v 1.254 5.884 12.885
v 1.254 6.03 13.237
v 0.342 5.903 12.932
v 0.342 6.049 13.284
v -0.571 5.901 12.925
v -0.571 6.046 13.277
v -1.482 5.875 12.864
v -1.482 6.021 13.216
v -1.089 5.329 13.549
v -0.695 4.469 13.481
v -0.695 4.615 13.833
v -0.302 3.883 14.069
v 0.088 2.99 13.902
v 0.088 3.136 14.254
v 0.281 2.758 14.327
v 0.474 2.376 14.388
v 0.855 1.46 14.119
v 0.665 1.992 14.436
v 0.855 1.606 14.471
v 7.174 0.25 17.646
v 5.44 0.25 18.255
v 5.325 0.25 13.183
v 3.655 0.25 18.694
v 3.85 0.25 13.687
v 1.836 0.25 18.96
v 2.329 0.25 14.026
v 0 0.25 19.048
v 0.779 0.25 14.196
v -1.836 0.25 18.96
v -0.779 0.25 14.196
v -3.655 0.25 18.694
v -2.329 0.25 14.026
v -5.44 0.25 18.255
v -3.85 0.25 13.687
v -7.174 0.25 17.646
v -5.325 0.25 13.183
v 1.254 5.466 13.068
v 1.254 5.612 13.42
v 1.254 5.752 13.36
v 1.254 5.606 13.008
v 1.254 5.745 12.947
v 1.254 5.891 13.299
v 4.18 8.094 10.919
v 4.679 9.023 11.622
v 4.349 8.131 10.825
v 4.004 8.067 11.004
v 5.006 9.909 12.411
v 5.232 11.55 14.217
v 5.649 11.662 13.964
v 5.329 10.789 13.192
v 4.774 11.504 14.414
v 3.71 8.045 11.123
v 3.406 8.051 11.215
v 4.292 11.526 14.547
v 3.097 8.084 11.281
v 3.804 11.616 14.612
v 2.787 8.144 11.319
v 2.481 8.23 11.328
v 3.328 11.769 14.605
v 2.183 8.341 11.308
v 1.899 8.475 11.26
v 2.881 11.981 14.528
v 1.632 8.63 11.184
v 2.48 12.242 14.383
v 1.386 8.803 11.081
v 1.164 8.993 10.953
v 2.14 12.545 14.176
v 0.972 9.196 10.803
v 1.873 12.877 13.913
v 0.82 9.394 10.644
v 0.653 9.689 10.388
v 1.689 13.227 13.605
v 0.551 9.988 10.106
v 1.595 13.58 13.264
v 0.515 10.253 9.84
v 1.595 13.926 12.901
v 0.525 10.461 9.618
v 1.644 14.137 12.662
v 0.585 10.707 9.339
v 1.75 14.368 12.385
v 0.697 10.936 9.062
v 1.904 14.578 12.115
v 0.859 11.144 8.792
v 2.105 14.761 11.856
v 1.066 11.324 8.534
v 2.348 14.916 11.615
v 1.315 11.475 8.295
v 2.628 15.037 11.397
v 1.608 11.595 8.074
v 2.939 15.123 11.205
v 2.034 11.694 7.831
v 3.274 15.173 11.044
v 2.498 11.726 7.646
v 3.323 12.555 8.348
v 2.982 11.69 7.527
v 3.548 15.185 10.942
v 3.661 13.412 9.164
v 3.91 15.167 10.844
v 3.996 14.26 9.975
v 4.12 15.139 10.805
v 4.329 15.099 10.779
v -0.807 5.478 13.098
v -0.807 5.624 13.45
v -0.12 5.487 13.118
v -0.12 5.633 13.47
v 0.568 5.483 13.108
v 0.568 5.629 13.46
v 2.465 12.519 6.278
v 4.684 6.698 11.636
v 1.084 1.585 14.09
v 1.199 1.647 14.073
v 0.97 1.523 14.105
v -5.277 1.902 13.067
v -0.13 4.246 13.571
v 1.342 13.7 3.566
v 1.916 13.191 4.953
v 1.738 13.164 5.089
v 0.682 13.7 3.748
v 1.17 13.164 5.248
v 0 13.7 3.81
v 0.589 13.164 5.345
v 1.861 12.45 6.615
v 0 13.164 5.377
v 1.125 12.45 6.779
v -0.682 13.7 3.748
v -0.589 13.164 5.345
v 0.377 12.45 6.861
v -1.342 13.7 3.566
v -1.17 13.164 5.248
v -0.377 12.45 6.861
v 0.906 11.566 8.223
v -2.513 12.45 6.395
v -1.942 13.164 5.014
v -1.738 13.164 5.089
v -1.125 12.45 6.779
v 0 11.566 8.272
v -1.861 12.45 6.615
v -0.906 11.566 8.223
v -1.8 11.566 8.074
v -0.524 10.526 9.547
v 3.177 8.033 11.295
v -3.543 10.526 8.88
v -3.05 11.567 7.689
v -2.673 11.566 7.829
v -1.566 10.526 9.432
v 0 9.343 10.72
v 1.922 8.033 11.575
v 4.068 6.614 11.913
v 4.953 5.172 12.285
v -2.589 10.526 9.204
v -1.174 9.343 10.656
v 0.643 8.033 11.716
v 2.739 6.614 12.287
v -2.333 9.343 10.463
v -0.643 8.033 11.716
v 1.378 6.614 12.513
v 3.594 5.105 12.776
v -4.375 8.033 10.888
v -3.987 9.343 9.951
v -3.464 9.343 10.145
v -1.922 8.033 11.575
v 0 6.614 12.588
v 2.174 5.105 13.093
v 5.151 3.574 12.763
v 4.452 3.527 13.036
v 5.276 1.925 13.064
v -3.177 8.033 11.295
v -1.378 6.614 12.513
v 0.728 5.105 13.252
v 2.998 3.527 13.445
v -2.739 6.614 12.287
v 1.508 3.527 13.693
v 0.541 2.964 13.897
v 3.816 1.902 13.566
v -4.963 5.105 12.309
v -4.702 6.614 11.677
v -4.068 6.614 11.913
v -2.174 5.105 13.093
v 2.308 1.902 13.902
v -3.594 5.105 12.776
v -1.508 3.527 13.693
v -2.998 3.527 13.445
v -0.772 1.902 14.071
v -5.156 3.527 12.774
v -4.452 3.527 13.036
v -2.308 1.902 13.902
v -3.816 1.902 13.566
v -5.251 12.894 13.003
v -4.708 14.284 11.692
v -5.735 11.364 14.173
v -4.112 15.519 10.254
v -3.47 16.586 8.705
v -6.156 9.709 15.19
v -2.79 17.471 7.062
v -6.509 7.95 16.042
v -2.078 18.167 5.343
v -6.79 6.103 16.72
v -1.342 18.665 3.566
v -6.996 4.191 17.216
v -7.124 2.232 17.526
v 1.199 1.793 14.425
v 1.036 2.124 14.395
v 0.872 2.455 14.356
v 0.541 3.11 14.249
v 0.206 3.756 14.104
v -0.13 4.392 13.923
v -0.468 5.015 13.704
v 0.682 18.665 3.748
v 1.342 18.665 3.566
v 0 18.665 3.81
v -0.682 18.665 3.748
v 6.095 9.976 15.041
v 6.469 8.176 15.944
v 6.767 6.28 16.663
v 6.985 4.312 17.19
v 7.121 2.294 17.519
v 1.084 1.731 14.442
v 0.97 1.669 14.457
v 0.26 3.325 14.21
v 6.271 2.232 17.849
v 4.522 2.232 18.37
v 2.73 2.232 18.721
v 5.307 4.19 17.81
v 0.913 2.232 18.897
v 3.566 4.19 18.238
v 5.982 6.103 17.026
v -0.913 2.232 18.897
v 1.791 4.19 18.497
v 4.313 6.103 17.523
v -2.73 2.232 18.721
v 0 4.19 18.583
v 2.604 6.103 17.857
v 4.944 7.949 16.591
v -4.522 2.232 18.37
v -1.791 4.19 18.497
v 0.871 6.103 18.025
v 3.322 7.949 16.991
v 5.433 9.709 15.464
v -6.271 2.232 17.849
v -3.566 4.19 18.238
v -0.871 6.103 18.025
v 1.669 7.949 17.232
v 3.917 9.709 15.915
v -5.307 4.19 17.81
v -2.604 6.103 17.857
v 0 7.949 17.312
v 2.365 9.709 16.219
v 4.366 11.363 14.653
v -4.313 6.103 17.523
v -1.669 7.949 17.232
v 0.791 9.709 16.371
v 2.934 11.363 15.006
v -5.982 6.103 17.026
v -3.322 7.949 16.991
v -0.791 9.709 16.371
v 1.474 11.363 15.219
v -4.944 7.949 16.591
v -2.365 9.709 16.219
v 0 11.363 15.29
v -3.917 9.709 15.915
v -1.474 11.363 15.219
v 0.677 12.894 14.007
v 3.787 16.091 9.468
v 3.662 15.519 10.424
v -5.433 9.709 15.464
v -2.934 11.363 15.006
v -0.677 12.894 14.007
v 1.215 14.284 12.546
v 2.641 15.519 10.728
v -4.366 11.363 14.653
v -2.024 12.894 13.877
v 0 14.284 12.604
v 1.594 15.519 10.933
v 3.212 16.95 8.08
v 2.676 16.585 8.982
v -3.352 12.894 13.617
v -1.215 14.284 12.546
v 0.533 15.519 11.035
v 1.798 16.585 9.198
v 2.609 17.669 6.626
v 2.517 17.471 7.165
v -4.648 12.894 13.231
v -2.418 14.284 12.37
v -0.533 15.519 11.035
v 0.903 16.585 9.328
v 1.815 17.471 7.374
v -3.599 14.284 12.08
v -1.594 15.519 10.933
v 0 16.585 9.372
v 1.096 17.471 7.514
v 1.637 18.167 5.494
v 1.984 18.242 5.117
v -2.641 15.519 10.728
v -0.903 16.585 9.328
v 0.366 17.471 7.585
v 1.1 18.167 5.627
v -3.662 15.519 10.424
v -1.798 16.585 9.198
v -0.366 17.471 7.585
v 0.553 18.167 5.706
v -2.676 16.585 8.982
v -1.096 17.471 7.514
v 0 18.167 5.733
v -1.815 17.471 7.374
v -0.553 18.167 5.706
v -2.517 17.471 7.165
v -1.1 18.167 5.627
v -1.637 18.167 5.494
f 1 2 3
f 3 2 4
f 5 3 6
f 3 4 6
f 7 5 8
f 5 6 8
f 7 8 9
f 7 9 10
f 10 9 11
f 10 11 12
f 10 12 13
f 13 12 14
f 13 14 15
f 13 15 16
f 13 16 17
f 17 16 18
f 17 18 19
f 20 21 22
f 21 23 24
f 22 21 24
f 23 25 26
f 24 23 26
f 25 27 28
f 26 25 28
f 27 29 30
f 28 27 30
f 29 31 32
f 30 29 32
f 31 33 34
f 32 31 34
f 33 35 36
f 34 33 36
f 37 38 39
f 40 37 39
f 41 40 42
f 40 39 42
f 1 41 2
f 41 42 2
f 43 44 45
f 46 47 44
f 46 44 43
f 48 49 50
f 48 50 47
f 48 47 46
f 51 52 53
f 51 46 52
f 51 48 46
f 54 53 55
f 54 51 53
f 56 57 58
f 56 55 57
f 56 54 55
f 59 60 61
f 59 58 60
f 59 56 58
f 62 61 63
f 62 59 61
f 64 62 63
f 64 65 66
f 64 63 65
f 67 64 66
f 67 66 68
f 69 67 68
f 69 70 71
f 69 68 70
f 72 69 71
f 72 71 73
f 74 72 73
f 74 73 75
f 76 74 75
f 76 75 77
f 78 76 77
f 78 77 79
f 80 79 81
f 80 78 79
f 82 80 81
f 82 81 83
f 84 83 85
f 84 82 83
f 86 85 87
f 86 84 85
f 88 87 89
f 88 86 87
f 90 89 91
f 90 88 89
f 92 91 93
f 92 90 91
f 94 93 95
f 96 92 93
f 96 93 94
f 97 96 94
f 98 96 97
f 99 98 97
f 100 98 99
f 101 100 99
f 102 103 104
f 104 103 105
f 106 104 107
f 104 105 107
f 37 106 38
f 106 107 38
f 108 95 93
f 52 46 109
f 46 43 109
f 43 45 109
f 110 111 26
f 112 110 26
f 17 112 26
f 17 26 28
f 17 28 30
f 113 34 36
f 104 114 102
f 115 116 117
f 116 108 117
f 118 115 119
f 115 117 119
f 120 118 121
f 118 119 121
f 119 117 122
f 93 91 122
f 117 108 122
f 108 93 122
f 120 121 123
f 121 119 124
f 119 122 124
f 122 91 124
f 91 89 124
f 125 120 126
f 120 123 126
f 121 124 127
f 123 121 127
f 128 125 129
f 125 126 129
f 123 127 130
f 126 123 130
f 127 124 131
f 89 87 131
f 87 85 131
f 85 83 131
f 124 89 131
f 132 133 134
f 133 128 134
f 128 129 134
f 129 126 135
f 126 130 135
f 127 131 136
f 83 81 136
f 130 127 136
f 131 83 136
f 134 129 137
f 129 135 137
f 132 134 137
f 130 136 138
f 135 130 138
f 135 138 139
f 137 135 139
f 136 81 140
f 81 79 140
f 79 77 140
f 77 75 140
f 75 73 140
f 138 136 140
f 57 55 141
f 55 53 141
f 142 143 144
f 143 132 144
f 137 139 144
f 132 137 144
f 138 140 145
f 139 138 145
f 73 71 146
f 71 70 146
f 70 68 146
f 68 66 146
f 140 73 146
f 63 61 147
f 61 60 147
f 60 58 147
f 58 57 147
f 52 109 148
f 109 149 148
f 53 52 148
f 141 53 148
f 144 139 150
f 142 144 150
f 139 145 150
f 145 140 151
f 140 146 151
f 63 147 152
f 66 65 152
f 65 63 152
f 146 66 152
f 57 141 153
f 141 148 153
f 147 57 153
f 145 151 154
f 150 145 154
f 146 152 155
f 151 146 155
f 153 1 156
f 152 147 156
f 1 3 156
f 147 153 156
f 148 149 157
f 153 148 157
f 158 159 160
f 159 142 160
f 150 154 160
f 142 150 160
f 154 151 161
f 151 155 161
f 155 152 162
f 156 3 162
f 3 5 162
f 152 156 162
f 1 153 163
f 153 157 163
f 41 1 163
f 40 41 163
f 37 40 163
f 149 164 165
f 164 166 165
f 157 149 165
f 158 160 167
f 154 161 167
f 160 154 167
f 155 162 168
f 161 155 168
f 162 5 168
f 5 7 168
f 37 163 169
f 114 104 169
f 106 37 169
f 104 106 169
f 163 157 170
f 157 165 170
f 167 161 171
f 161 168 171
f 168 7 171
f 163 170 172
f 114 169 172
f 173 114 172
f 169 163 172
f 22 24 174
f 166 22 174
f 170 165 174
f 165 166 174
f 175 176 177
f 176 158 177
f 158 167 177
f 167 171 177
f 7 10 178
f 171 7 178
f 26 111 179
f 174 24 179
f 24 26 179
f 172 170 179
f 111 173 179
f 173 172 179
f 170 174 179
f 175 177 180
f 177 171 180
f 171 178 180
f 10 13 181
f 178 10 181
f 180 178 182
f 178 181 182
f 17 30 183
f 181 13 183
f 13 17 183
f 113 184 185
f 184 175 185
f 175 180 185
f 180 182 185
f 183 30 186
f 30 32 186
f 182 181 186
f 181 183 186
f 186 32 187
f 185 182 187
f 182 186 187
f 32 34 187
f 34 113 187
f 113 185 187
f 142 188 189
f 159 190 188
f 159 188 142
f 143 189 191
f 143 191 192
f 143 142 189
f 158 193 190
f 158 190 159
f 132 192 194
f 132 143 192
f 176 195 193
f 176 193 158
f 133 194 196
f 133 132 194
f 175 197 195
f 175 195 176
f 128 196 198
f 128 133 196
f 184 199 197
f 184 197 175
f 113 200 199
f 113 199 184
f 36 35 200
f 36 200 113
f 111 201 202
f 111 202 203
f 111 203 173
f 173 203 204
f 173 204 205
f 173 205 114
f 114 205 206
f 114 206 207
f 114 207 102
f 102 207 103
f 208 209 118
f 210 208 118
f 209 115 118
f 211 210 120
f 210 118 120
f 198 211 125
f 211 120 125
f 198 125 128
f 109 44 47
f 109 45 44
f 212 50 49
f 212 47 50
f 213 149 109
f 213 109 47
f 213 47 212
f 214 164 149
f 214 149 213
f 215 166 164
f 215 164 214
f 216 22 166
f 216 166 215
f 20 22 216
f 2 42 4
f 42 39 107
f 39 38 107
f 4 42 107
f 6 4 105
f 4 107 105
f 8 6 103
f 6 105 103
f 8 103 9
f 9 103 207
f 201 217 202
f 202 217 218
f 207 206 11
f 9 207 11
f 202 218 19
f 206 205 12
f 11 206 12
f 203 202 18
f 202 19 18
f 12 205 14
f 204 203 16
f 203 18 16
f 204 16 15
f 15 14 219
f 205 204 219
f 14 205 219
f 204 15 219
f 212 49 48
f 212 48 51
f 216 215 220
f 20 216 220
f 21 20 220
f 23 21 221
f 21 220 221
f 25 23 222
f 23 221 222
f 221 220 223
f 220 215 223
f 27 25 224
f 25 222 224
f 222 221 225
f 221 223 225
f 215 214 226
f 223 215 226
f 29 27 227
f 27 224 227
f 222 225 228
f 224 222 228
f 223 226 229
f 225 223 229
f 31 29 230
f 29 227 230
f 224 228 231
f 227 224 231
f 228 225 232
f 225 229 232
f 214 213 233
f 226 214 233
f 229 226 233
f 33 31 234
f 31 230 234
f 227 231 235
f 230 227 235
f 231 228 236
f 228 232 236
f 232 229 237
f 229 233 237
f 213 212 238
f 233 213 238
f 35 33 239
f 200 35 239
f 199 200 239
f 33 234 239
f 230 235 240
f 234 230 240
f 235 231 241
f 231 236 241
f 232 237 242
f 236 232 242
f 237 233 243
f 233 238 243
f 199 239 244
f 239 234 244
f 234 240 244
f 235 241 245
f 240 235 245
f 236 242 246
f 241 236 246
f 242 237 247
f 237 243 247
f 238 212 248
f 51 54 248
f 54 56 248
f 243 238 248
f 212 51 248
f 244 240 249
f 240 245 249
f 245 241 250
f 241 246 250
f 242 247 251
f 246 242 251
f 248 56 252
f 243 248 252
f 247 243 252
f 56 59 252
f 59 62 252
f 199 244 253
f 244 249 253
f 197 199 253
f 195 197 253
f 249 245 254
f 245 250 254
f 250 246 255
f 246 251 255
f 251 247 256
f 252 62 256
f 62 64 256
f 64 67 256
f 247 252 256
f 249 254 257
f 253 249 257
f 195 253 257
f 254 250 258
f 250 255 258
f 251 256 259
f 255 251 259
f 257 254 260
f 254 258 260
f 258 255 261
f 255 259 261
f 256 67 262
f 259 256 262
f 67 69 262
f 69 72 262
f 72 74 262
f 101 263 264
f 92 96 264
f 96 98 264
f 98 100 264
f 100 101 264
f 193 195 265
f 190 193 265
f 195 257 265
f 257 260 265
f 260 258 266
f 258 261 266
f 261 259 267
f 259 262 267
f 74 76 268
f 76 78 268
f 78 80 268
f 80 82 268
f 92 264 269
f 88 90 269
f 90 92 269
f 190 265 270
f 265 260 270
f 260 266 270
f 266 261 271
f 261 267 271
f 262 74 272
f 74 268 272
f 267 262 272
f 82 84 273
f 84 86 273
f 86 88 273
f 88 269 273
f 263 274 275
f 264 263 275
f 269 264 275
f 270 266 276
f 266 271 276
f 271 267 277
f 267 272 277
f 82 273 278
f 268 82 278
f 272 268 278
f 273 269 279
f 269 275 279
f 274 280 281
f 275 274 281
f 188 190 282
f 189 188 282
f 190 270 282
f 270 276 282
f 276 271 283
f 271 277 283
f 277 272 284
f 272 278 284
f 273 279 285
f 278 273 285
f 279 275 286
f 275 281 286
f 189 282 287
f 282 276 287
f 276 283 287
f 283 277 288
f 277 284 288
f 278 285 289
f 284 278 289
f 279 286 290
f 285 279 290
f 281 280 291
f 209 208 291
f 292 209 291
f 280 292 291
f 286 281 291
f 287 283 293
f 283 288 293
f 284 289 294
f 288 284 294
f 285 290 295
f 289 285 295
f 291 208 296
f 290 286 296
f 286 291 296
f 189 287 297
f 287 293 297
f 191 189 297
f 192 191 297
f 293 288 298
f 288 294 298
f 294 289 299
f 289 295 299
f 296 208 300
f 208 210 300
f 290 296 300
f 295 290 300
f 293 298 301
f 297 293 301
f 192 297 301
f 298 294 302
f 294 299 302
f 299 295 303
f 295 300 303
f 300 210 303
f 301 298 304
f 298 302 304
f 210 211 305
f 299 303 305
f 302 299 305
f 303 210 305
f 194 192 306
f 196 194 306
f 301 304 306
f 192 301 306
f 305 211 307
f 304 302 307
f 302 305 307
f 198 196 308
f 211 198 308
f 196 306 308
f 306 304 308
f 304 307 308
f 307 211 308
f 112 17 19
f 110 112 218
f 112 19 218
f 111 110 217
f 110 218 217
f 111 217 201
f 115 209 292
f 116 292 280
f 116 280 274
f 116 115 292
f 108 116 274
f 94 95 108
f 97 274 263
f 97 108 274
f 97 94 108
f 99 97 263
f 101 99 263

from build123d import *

# Parameters (mm, degrees)
REVOLVE1_ANGLE            = 45
CUT_EXTRUDE1_DEPTH        = 28.647117169
CUT_EXTRUDE1_DEPTH_BACK   = 28.647117169
CUT_EXTRUDE4_REACH        = 29.998
CUT_EXTRUDE4_START_RADIUS = 14.22
CUT_EXTRUDE4_END_RADIUS   = 14.22
CUT_EXTRUDE5_DEPTH        = 27.866361913
CUT_EXTRUDE5_DEPTH_BACK   = 27.866361913
SKETCH9_R                 = 2.6035


with BuildPart() as part:
    # Sketch1 → Revolve1 (revolve, symmetric)
    with BuildSketch(Plane(origin=(0, 0, 0), x_dir=(0, 0, -1), z_dir=(1, 0, 0))) as revolve1_sk:
        with BuildLine():
            Line((-14.217802221, 0.25), (-19.048359509, 0.25))
            ThreePointArc((-19.048359509, 0.25), (-14.676690222, 12.144845166), (-3.81, 18.66511184))
            Line((-3.81, 18.66511184), (-3.81, 13.700083941))
            ThreePointArc((-3.81, 13.700083941), (-11.246181696, 8.70240181), (-14.217802221, 0.25))
        make_face()
    revolve(axis=Axis((0, 0, 0), (0, 1, 0)), revolution_arc=REVOLVE1_ANGLE / 2)
    revolve(revolve1_sk.sketch, axis=Axis((0, 0, 0), (0, -1, 0)), revolution_arc=REVOLVE1_ANGLE / 2)

    # Sketch2 → Cut-Extrude1 (cut, two sides: drawn at the far end of the back side and taken through both)
    with BuildSketch(Plane(origin=(0, 0, 0), x_dir=(1, 0, 0), z_dir=(0, 1, 0)).offset(-CUT_EXTRUDE1_DEPTH_BACK)):
        with BuildLine():
            Line((7.289491598, -17.598389479), (1.458023877, -3.519981019))
            ThreePointArc((1.458023877, -3.519981019), (1.400077392, -3.543428184), (1.341754023, -3.5659215))
            Line((1.341754023, -3.5659215), (7.173849701, -17.645845983))
            ThreePointArc((7.173849701, -17.645845983), (7.231709577, -17.622212591), (7.289491598, -17.598389479))
        make_face()
        with BuildLine():
            Line((-7.173849701, -17.645845983), (-1.341754023, -3.5659215))
            ThreePointArc((-1.341754023, -3.5659215), (-1.400077392, -3.543428184), (-1.458023877, -3.519981019))
            Line((-1.458023877, -3.519981019), (-7.289491598, -17.598389479))
            ThreePointArc((-7.289491598, -17.598389479), (-7.231709577, -17.622212591), (-7.173849701, -17.645845983))
        make_face()
    extrude(amount=CUT_EXTRUDE1_DEPTH + CUT_EXTRUDE1_DEPTH_BACK, mode=Mode.SUBTRACT)

    # Cut-Extrude4: from a sphere face, 29.998 long prism both ways, kept between that surface and its translate by the depth
    cut_extrude4_start = Location((0, 0, 0)) * Sphere(CUT_EXTRUDE4_START_RADIUS, mode=Mode.PRIVATE)
    cut_extrude4_end = Location((0, 0.145802388, 0.351998102)) * Sphere(CUT_EXTRUDE4_END_RADIUS, mode=Mode.PRIVATE)
    # Sketch8 → Cut-Extrude4 (cut, from a surface)
    with BuildSketch(Plane(origin=(0, 0, 0), x_dir=(-1, 0, 0), z_dir=(0, 0.3826834323650899, 0.9238795325112868)), mode=Mode.PRIVATE) as cut_extrude4_sk1:
        Polygon((-1.253717949, -0.505052528), (1.481666667, -0.505052528), (-0.854807692, 4.053921831), (-1.199402043, 3.864261374), (0.80672476, -0.049155093), (-1.253717949, -0.049155093), align=None)
    cut_extrude4_tool1 = extrude(cut_extrude4_sk1.sketch, amount=CUT_EXTRUDE4_REACH, both=True, mode=Mode.PRIVATE)
    add(((cut_extrude4_tool1 - cut_extrude4_start) & cut_extrude4_end).solids().sort_by_distance((-0.113974, 5.809704, 12.845032))[0], mode=Mode.SUBTRACT)

    # Sketch9 → Cut-Extrude5 (cut, two sides: drawn at the far end of the back side and taken through both)
    with BuildSketch(Plane(origin=(5.827608686, 18.858537854, 17.935535314), x_dir=(-0.8206892018836905, -0.23968096505674552, 0.5186735668038023), z_dir=(-0.2185080122244017, -0.7071067811865477, -0.67249851196396)).offset(-CUT_EXTRUDE5_DEPTH_BACK)):
        Circle(SKETCH9_R)
    extrude(amount=CUT_EXTRUDE5_DEPTH + CUT_EXTRUDE5_DEPTH_BACK, mode=Mode.SUBTRACT)


solid = part.part
